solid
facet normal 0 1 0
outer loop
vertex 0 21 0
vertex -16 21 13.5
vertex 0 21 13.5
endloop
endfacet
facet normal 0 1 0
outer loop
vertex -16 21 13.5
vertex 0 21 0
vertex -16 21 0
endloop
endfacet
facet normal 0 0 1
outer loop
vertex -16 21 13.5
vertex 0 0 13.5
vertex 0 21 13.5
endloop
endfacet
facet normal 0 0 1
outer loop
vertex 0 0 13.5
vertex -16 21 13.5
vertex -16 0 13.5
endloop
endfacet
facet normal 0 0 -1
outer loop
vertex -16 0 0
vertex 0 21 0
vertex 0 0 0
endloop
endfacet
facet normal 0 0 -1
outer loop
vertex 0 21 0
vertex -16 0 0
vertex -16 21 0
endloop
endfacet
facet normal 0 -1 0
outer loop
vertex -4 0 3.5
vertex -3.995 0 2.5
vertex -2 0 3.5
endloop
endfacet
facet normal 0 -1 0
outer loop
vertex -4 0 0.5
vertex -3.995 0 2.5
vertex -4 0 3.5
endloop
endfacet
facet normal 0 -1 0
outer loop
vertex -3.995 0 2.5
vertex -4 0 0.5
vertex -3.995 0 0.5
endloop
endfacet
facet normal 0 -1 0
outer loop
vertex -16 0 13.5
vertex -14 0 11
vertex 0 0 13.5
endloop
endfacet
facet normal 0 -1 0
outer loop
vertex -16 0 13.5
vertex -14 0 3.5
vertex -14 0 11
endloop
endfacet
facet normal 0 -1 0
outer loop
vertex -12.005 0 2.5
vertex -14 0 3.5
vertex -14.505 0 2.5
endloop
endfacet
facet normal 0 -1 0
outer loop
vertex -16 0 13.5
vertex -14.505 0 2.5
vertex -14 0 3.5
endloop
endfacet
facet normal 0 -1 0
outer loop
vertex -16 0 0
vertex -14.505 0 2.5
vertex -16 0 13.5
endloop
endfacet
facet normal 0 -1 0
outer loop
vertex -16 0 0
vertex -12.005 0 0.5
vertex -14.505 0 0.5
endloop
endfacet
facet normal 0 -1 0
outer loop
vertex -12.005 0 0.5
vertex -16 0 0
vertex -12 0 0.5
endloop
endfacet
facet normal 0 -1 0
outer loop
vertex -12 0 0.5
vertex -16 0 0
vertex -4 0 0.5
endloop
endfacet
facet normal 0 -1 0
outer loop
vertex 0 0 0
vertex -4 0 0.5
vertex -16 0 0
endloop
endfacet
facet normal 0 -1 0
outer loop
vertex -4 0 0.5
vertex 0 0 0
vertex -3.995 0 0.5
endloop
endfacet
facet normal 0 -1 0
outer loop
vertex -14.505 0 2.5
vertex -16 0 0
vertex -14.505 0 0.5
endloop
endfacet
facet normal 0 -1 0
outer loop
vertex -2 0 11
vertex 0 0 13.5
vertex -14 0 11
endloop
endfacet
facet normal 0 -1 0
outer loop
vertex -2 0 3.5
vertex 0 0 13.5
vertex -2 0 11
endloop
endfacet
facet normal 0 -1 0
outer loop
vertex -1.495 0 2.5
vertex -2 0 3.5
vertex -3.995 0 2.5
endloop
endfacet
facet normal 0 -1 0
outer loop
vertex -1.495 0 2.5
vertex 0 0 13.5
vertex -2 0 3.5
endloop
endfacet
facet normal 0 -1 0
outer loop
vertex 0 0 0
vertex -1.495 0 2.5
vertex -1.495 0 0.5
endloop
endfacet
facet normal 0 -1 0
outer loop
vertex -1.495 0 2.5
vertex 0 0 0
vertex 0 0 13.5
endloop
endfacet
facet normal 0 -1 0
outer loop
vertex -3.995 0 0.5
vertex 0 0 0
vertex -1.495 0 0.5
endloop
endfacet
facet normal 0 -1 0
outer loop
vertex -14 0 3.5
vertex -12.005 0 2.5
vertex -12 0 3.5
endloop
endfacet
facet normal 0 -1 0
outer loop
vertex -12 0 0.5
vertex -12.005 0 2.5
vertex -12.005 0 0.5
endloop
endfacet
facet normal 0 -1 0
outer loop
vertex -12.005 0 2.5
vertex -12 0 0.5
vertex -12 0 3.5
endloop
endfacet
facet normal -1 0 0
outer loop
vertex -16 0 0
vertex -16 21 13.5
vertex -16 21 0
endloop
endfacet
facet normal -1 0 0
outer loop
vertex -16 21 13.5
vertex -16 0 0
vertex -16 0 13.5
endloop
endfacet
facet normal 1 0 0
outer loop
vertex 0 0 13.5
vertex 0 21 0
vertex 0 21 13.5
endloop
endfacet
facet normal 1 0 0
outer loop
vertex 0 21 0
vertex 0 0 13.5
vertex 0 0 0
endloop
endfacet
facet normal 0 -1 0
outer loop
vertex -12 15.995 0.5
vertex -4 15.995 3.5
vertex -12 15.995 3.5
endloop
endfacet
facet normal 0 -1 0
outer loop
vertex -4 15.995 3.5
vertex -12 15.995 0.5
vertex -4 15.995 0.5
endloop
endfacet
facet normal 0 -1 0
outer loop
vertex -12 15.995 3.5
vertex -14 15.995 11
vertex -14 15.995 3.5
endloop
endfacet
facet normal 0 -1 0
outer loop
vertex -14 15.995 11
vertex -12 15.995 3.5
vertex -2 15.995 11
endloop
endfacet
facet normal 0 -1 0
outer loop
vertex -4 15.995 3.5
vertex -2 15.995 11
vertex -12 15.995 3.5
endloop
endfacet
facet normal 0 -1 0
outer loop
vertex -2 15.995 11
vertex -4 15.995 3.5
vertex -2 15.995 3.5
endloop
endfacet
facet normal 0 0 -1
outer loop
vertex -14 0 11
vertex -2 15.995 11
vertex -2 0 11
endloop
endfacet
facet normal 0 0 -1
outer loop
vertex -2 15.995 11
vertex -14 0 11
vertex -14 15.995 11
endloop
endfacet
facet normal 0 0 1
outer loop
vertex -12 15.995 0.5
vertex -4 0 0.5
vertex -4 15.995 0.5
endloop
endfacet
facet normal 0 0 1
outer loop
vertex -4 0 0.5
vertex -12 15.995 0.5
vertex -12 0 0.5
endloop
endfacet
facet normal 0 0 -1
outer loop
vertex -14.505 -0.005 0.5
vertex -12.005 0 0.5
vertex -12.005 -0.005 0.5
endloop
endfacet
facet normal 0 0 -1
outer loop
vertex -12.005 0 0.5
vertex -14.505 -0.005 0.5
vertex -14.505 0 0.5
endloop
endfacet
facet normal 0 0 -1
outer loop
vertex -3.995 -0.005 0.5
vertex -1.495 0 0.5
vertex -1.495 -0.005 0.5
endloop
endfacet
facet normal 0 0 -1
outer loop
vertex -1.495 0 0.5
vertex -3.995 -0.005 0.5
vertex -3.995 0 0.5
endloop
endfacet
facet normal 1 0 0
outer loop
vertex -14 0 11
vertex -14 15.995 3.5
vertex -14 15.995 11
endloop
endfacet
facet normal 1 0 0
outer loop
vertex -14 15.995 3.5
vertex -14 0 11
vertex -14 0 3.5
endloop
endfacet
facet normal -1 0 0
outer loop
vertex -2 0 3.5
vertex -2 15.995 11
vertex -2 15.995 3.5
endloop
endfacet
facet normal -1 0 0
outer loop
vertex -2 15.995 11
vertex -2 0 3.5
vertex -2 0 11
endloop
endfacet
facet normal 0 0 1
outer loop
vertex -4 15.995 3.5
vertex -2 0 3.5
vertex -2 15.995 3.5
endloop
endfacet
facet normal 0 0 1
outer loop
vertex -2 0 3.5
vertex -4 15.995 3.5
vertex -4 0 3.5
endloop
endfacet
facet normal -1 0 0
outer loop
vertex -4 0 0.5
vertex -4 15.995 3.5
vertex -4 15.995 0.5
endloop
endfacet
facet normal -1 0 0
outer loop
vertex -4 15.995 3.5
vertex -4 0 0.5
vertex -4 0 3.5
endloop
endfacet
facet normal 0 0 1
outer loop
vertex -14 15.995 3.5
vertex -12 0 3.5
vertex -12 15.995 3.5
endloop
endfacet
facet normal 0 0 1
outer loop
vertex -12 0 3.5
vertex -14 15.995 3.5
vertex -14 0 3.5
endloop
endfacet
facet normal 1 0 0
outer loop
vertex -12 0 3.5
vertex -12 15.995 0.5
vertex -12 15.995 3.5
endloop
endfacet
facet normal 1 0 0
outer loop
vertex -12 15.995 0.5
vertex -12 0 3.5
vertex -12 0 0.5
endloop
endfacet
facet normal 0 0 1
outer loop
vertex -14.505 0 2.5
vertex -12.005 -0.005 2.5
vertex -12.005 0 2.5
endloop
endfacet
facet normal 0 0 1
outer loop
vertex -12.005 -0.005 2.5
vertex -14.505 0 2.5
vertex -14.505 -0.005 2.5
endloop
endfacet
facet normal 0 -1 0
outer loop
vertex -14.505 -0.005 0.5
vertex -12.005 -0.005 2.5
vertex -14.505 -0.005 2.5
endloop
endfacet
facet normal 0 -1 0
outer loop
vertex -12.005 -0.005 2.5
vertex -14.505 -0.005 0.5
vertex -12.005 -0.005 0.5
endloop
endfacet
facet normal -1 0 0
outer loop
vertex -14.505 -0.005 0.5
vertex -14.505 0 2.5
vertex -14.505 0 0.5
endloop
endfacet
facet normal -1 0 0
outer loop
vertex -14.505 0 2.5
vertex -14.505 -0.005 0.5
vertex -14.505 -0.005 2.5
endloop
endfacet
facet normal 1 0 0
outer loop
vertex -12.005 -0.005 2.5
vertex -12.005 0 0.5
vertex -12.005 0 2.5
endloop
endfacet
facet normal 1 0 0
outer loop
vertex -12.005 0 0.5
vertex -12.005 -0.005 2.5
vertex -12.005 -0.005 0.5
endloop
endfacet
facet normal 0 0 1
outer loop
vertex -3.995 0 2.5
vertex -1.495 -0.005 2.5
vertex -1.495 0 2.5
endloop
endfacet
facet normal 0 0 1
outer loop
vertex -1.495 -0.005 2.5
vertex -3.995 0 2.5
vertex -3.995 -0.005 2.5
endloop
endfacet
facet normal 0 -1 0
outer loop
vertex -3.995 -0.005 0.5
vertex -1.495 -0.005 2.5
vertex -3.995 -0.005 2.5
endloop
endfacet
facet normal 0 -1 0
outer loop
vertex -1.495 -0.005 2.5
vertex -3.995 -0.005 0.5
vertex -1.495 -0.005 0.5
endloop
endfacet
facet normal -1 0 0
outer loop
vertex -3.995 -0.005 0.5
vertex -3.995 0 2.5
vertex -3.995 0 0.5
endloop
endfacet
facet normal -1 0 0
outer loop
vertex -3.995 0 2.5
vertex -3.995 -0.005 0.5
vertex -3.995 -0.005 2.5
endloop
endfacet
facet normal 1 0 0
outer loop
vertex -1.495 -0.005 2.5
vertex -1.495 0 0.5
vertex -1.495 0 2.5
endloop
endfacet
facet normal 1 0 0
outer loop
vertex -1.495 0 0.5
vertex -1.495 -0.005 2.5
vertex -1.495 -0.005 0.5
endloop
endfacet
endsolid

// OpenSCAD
include <../../lib/device/component.scad>;

rotate([0,0,90]) ethernet();
